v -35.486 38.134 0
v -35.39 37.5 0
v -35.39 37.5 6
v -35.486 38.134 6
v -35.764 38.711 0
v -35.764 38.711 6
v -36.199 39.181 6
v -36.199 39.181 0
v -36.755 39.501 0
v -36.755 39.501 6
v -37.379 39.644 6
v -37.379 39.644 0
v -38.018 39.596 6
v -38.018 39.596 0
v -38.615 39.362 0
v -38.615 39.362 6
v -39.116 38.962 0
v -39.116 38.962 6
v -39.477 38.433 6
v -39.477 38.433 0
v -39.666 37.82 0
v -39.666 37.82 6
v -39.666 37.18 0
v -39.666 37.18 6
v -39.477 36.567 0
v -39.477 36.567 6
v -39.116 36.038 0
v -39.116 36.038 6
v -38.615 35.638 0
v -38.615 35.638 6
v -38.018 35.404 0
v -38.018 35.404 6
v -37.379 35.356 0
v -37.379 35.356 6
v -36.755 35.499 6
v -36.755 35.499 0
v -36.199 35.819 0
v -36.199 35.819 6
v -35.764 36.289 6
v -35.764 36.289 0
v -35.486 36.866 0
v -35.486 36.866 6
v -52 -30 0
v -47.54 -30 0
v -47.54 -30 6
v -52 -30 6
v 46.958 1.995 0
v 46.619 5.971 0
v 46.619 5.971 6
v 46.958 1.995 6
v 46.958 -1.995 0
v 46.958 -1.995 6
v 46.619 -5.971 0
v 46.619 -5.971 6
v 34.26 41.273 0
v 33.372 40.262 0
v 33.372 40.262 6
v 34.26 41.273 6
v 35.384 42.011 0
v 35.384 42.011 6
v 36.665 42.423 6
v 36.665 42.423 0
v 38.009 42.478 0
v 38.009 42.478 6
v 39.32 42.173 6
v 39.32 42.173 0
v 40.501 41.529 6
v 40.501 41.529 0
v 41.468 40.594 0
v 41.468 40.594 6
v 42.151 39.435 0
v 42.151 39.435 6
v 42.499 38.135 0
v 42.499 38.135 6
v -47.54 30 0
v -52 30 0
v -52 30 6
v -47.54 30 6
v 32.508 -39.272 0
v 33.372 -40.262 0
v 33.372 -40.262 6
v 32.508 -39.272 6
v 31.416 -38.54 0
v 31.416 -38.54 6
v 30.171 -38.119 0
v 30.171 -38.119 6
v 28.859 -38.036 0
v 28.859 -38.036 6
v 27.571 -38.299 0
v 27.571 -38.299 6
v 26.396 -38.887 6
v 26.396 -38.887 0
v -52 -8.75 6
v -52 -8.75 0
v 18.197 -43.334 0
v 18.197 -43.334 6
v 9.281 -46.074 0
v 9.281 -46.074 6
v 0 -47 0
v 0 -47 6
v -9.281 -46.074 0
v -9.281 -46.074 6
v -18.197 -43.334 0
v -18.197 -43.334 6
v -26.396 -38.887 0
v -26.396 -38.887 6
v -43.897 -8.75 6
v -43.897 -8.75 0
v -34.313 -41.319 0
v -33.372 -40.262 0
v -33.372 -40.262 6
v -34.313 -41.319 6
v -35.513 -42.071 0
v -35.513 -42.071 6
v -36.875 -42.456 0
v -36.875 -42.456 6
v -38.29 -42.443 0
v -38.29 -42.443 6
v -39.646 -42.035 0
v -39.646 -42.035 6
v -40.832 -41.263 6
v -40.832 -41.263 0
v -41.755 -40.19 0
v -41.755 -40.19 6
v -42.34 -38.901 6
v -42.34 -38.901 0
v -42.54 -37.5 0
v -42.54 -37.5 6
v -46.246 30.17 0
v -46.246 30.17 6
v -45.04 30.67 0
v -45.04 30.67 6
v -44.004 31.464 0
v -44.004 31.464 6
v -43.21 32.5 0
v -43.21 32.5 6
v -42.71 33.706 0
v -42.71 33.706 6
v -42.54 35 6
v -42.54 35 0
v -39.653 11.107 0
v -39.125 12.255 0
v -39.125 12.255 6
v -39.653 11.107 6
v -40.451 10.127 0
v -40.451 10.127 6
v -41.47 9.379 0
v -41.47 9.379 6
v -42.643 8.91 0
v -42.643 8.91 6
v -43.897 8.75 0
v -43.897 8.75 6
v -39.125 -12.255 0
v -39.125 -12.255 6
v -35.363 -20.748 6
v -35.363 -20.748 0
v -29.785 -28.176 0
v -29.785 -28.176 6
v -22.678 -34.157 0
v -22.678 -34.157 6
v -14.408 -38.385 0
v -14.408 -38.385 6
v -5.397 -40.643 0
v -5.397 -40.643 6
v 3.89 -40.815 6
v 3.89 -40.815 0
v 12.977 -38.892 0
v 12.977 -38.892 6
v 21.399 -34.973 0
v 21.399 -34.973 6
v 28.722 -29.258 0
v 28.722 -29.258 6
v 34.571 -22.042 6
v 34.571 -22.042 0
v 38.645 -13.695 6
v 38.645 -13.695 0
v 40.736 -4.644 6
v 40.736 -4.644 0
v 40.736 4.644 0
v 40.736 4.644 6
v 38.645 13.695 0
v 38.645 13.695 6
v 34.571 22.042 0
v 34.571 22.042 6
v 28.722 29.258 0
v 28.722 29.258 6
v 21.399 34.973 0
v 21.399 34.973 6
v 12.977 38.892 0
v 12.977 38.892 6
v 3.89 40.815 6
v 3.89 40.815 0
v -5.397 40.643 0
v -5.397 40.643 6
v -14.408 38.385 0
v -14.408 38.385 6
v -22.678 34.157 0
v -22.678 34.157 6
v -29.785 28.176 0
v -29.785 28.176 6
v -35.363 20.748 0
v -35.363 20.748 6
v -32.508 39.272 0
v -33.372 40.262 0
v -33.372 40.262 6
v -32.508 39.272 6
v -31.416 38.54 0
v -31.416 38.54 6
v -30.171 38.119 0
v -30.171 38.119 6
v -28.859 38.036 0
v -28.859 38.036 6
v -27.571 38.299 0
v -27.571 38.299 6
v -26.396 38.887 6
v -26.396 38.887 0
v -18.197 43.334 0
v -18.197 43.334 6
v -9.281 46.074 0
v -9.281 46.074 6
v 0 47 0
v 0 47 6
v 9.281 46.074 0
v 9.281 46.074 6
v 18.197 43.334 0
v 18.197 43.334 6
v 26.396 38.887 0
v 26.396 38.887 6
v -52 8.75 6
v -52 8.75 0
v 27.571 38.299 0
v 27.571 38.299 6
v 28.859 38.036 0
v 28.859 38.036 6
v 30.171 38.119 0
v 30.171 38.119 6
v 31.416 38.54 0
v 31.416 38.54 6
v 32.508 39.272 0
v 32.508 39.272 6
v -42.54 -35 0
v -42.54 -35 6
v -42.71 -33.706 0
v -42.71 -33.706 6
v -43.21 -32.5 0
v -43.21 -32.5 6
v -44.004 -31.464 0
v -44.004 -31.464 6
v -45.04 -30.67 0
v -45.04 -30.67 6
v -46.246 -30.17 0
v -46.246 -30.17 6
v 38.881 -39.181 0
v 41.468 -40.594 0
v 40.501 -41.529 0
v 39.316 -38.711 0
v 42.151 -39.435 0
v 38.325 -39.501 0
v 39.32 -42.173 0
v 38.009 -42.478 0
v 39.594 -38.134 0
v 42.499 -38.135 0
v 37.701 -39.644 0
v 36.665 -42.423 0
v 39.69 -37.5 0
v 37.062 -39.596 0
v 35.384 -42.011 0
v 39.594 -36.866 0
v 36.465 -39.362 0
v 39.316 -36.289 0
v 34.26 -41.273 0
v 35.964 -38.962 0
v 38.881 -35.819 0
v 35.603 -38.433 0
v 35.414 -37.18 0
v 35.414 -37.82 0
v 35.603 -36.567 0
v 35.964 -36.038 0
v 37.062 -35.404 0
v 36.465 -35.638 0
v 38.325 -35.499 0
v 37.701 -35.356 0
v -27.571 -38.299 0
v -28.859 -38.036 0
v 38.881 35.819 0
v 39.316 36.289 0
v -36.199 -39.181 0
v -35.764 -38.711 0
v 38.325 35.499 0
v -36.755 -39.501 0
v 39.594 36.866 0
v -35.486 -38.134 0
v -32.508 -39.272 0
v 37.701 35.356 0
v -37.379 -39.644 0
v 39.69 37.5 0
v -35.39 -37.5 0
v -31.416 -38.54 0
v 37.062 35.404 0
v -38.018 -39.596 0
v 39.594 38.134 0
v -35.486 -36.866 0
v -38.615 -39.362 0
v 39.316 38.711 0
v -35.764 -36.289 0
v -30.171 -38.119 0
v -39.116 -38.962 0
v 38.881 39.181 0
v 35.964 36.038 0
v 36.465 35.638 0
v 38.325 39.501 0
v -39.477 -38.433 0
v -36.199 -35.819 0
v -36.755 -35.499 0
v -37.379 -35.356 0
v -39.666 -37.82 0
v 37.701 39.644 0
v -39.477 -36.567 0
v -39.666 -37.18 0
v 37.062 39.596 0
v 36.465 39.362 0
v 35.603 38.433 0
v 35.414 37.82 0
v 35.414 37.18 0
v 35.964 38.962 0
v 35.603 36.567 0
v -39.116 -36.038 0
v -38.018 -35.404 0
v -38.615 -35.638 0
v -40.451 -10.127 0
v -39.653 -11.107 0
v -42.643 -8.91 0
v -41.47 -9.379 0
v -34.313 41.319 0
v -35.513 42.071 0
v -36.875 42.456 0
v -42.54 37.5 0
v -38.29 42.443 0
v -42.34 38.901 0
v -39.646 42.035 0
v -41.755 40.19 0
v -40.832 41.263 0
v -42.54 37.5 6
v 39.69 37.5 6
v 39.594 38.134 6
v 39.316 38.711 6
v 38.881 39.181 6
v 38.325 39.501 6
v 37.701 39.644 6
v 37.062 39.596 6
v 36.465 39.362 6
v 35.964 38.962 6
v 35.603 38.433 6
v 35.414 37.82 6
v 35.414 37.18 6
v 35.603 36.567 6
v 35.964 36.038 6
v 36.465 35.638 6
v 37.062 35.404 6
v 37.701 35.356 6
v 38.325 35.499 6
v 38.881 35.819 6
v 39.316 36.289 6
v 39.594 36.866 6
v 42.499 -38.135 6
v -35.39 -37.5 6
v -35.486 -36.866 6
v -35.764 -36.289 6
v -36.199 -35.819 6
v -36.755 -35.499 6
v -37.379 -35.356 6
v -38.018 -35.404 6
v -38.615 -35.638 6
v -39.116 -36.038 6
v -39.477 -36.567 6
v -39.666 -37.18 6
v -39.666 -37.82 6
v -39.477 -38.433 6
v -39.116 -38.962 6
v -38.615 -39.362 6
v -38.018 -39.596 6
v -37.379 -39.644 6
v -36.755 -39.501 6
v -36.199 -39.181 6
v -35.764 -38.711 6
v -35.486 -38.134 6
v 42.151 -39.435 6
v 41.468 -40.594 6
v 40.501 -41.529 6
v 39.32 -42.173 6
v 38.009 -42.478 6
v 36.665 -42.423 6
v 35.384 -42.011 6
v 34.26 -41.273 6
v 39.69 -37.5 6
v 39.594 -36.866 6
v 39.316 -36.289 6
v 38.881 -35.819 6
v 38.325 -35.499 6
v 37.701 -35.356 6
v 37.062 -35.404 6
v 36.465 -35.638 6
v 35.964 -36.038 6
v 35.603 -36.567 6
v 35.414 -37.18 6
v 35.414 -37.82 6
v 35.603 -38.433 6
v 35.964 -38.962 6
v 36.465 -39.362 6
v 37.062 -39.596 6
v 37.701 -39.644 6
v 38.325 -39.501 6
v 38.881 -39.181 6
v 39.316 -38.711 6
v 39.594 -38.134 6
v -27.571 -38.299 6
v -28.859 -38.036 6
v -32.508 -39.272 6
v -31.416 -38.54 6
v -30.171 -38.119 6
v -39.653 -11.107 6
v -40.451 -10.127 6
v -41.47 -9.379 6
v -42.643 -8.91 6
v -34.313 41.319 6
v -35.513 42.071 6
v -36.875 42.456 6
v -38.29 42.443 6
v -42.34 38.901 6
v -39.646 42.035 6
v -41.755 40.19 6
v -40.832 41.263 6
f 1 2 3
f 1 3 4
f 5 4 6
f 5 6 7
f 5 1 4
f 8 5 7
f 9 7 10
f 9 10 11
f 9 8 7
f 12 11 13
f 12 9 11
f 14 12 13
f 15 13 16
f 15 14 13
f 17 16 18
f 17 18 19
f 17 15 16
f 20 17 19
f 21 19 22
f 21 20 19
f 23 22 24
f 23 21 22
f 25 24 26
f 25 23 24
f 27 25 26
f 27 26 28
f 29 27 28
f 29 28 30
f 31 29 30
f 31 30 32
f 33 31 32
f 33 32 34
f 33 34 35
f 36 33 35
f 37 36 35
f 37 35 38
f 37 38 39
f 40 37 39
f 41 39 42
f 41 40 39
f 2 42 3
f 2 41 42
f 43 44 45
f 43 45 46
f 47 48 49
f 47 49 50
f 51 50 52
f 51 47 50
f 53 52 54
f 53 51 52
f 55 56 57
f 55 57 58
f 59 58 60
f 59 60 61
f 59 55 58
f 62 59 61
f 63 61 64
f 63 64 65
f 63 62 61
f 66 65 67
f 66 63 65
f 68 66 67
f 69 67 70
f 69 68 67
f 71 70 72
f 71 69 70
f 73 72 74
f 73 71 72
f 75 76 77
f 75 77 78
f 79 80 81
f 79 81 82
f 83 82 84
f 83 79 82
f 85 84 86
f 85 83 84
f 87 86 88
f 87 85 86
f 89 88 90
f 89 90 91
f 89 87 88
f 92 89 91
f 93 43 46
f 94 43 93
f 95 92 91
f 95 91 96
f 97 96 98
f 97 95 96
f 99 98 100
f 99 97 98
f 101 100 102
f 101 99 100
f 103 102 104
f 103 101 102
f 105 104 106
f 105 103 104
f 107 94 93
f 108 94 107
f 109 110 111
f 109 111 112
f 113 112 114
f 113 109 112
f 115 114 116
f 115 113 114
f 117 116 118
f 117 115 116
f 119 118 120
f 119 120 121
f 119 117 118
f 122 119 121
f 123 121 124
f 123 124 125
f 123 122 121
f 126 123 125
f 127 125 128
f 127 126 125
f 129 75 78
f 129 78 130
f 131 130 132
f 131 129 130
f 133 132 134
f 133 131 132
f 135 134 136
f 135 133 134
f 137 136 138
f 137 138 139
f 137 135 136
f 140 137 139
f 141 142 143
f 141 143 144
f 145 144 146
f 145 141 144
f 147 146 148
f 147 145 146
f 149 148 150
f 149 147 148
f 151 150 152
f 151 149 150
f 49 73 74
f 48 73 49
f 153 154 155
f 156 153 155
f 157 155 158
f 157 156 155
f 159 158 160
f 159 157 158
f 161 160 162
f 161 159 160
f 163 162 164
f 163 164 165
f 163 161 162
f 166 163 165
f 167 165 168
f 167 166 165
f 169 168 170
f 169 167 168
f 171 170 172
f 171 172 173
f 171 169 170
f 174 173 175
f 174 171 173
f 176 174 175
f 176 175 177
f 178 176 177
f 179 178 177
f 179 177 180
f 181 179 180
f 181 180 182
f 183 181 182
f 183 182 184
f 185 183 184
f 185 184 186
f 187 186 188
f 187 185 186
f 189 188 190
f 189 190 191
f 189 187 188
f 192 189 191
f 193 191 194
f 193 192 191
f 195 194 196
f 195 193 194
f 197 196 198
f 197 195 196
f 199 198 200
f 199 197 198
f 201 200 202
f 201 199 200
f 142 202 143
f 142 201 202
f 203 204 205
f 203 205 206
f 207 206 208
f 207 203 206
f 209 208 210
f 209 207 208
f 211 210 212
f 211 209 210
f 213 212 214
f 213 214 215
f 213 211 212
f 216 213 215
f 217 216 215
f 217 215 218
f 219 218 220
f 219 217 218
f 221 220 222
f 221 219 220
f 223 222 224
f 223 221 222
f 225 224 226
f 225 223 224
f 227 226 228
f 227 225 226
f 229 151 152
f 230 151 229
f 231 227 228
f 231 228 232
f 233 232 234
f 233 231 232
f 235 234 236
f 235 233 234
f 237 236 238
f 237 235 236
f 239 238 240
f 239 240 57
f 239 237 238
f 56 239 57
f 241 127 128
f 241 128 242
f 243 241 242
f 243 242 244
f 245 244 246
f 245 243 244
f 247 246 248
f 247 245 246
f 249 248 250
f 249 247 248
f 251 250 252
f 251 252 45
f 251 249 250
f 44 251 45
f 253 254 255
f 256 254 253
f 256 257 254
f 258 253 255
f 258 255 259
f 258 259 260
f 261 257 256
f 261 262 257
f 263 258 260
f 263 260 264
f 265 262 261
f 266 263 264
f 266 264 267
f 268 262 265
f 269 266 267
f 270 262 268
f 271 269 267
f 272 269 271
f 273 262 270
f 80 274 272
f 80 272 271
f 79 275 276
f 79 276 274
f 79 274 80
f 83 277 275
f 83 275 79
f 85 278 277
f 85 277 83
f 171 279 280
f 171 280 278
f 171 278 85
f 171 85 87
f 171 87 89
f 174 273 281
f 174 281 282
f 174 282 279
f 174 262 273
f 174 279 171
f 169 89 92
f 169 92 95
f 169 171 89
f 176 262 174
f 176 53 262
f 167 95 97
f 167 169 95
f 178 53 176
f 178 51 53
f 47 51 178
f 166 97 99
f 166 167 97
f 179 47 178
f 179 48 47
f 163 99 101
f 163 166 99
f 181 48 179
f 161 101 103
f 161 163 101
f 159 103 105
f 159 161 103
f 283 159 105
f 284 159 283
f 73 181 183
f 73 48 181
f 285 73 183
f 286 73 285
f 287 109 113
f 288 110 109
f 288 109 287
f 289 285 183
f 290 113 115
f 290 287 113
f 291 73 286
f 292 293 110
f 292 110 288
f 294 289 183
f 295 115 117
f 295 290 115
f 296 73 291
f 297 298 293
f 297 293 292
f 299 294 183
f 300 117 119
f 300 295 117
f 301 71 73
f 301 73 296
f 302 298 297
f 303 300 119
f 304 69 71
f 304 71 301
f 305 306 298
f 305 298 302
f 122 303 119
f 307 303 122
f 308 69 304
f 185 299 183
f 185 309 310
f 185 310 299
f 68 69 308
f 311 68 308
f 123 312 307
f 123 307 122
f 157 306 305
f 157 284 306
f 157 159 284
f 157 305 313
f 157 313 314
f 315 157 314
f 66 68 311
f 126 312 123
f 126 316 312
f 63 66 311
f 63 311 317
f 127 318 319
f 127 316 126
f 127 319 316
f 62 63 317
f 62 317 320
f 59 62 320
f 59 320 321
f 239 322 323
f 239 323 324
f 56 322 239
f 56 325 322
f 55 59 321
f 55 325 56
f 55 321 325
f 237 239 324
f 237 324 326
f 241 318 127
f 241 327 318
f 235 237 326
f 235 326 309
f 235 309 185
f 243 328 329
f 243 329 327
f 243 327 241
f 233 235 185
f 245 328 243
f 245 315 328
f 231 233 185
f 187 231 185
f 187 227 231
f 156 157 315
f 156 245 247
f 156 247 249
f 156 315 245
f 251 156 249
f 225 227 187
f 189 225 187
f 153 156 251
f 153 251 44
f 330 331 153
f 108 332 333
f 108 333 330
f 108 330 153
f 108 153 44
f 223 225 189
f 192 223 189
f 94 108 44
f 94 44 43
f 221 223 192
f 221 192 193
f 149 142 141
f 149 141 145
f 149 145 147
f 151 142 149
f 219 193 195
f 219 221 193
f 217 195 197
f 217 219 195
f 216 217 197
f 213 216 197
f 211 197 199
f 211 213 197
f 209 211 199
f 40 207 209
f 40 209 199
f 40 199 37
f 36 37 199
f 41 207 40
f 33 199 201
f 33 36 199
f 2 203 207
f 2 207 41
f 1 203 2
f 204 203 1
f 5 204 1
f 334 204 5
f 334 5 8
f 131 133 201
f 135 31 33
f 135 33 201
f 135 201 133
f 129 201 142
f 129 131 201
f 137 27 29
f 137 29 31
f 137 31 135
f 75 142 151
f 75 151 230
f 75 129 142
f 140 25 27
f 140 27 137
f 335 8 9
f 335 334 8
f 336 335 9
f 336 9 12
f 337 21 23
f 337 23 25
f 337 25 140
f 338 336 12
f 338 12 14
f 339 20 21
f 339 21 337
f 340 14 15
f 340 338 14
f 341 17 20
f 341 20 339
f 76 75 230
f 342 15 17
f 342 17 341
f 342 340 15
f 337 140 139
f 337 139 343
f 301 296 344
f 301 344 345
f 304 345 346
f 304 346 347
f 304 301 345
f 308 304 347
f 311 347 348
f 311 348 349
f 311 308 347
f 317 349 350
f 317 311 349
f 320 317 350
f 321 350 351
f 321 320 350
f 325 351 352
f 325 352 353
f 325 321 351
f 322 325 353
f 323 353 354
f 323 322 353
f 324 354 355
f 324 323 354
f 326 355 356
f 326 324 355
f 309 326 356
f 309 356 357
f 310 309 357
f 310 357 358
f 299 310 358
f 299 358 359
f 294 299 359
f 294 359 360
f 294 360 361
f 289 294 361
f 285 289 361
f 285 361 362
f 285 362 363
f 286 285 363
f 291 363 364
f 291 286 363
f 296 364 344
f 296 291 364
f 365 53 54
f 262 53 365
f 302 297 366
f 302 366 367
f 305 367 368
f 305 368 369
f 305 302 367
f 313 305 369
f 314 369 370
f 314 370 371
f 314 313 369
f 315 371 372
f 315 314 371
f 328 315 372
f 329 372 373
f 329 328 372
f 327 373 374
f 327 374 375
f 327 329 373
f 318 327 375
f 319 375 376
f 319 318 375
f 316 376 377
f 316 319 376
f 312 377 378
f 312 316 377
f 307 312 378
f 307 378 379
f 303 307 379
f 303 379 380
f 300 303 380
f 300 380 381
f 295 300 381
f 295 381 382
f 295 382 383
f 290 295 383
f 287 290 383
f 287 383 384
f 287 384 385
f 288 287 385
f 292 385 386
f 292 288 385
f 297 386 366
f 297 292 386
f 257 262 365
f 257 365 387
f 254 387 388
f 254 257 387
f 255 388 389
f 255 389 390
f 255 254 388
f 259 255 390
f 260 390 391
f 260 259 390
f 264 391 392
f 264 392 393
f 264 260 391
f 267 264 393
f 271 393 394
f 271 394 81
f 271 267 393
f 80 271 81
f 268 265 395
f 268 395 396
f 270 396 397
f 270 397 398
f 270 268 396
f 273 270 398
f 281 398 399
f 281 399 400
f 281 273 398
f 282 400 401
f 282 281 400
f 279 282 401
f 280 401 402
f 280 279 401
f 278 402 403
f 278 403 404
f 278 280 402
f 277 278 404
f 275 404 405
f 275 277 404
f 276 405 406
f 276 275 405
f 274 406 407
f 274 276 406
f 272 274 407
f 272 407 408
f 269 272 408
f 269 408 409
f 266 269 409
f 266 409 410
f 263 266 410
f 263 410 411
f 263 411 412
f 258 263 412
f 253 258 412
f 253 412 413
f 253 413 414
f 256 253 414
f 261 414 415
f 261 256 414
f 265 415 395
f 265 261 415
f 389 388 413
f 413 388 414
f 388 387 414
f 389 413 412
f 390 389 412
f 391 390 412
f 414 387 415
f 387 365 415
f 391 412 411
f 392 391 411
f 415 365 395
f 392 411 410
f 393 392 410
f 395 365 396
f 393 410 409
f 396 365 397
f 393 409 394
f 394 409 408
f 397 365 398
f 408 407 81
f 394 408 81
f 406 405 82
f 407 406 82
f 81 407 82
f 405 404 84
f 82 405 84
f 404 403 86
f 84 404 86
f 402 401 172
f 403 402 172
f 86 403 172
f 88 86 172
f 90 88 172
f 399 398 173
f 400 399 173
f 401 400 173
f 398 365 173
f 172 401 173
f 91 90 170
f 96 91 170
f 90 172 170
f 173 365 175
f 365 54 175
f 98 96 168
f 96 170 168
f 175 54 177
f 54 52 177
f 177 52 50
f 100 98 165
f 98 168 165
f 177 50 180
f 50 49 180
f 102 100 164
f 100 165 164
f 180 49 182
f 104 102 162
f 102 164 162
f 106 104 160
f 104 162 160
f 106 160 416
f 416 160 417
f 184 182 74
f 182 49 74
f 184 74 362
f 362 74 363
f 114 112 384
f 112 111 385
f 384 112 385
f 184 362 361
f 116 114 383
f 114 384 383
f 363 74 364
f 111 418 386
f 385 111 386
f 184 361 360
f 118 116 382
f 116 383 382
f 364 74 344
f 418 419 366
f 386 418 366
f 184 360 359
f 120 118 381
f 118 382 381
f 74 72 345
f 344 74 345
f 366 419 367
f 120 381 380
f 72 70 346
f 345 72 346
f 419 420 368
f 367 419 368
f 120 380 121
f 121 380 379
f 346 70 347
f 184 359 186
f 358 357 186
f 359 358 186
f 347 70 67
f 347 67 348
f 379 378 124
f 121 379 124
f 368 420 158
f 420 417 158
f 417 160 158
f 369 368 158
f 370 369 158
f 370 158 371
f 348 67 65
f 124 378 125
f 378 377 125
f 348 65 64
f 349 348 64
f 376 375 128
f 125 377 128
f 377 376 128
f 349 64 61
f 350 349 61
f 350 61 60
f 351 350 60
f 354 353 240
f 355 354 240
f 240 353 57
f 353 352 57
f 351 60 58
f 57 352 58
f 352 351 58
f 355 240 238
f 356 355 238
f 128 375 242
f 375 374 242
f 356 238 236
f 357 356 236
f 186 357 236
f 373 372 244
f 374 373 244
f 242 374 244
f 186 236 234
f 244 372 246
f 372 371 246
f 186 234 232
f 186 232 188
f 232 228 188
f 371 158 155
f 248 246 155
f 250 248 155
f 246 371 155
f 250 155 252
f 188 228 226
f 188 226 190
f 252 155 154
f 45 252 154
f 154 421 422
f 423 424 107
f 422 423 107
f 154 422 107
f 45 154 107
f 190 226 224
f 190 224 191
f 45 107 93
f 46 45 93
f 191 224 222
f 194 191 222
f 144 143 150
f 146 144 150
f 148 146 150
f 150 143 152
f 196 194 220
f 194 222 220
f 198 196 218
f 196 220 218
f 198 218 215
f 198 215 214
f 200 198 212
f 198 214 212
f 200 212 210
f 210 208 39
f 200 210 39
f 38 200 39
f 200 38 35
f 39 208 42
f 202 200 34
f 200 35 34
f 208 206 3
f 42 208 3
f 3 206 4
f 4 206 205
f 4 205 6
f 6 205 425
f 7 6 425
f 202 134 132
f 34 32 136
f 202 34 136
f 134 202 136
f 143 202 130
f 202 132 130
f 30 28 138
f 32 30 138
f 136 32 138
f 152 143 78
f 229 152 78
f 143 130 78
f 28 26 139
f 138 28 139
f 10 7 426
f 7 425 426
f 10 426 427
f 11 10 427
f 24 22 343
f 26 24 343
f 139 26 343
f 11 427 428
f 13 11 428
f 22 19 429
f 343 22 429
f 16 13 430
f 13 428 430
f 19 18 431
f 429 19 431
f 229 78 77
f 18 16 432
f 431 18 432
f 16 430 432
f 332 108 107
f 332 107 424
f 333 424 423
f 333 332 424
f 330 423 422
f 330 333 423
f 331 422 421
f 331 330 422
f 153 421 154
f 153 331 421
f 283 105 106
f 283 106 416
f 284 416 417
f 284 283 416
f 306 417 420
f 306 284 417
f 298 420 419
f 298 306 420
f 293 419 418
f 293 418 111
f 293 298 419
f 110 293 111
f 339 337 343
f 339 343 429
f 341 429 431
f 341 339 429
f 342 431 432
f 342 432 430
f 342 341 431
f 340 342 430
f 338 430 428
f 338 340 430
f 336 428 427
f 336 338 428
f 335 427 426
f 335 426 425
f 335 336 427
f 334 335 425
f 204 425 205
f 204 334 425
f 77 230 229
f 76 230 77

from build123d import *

# Parameters (mm, degrees)
SKETCH_1_R      = 2.15
EXTRUDE_1_DEPTH = 6


with BuildPart() as part:
    # 草图1 → 凸台-拉伸1 (new body)
    with BuildSketch(Plane.XY):
        with BuildLine():
            ThreePointArc((-43.896896246, -8.75), (-40.93656063, -9.720556733), (-39.12549448, -12.255434783))
            ThreePointArc((-39.12549448, -12.255434783), (41, 0), (-39.12549448, 12.255434783))
            ThreePointArc((-39.12549448, 12.255434783), (-40.93656063, 9.720556733), (-43.896896246, 8.75))
            Line((-43.896896246, 8.75), (-52, 8.75))
            Line((-52, 8.75), (-52, 30))
            Line((-52, 30), (-47.54, 30))
            ThreePointArc((-47.54, 30), (-44.004466094, 31.464466094), (-42.54, 35))
            Line((-42.54, 35), (-42.54, 37.5))
            ThreePointArc((-42.54, 37.5), (-38.982425028, 42.287422066), (-33.372235985, 40.262198963))
            ThreePointArc((-33.372235985, 40.262198963), (-30.171244586, 38.118753147), (-26.396349665, 38.887436588))
            ThreePointArc((-26.396349665, 38.887436588), (0, 47), (26.396349665, 38.887436588))
            ThreePointArc((26.396349665, 38.887436588), (30.171244586, 38.118753147), (33.372235985, 40.262198963))
            ThreePointArc((33.372235985, 40.262198963), (38.674773042, 42.369526686), (42.499484755, 38.135225128))
            Line((42.499484755, 38.135225128), (46.619156699, 5.971116201))
            ThreePointArc((46.619156699, 5.971116201), (47, 0), (46.619156699, -5.971116201))
            Line((46.619156699, -5.971116201), (42.499484755, -38.135225128))
            ThreePointArc((42.499484755, -38.135225128), (38.674773042, -42.369526686), (33.372235985, -40.262198963))
            ThreePointArc((33.372235985, -40.262198963), (30.171244586, -38.118753147), (26.396349665, -38.887436588))
            ThreePointArc((26.396349665, -38.887436588), (0, -47), (-26.396349665, -38.887436588))
            ThreePointArc((-26.396349665, -38.887436588), (-30.171244586, -38.118753147), (-33.372235985, -40.262198963))
            ThreePointArc((-33.372235985, -40.262198963), (-38.982425028, -42.287422066), (-42.54, -37.5))
            Line((-42.54, -37.5), (-42.54, -35))
            ThreePointArc((-42.54, -35), (-44.004466094, -31.464466094), (-47.54, -30))
            Line((-47.54, -30), (-52, -30))
            Line((-52, -30), (-52, -8.75))
            Line((-52, -8.75), (-43.896896246, -8.75))
        make_face()
        with Locations((37.54, -37.5)):
            Circle(SKETCH_1_R, mode=Mode.SUBTRACT)
        with Locations((-37.54, -37.5)):
            Circle(SKETCH_1_R, mode=Mode.SUBTRACT)
        with Locations((-37.54, 37.5)):
            Circle(SKETCH_1_R, mode=Mode.SUBTRACT)
        with Locations((37.54, 37.5)):
            Circle(SKETCH_1_R, mode=Mode.SUBTRACT)
    extrude(amount=EXTRUDE_1_DEPTH)


solid = part.part
